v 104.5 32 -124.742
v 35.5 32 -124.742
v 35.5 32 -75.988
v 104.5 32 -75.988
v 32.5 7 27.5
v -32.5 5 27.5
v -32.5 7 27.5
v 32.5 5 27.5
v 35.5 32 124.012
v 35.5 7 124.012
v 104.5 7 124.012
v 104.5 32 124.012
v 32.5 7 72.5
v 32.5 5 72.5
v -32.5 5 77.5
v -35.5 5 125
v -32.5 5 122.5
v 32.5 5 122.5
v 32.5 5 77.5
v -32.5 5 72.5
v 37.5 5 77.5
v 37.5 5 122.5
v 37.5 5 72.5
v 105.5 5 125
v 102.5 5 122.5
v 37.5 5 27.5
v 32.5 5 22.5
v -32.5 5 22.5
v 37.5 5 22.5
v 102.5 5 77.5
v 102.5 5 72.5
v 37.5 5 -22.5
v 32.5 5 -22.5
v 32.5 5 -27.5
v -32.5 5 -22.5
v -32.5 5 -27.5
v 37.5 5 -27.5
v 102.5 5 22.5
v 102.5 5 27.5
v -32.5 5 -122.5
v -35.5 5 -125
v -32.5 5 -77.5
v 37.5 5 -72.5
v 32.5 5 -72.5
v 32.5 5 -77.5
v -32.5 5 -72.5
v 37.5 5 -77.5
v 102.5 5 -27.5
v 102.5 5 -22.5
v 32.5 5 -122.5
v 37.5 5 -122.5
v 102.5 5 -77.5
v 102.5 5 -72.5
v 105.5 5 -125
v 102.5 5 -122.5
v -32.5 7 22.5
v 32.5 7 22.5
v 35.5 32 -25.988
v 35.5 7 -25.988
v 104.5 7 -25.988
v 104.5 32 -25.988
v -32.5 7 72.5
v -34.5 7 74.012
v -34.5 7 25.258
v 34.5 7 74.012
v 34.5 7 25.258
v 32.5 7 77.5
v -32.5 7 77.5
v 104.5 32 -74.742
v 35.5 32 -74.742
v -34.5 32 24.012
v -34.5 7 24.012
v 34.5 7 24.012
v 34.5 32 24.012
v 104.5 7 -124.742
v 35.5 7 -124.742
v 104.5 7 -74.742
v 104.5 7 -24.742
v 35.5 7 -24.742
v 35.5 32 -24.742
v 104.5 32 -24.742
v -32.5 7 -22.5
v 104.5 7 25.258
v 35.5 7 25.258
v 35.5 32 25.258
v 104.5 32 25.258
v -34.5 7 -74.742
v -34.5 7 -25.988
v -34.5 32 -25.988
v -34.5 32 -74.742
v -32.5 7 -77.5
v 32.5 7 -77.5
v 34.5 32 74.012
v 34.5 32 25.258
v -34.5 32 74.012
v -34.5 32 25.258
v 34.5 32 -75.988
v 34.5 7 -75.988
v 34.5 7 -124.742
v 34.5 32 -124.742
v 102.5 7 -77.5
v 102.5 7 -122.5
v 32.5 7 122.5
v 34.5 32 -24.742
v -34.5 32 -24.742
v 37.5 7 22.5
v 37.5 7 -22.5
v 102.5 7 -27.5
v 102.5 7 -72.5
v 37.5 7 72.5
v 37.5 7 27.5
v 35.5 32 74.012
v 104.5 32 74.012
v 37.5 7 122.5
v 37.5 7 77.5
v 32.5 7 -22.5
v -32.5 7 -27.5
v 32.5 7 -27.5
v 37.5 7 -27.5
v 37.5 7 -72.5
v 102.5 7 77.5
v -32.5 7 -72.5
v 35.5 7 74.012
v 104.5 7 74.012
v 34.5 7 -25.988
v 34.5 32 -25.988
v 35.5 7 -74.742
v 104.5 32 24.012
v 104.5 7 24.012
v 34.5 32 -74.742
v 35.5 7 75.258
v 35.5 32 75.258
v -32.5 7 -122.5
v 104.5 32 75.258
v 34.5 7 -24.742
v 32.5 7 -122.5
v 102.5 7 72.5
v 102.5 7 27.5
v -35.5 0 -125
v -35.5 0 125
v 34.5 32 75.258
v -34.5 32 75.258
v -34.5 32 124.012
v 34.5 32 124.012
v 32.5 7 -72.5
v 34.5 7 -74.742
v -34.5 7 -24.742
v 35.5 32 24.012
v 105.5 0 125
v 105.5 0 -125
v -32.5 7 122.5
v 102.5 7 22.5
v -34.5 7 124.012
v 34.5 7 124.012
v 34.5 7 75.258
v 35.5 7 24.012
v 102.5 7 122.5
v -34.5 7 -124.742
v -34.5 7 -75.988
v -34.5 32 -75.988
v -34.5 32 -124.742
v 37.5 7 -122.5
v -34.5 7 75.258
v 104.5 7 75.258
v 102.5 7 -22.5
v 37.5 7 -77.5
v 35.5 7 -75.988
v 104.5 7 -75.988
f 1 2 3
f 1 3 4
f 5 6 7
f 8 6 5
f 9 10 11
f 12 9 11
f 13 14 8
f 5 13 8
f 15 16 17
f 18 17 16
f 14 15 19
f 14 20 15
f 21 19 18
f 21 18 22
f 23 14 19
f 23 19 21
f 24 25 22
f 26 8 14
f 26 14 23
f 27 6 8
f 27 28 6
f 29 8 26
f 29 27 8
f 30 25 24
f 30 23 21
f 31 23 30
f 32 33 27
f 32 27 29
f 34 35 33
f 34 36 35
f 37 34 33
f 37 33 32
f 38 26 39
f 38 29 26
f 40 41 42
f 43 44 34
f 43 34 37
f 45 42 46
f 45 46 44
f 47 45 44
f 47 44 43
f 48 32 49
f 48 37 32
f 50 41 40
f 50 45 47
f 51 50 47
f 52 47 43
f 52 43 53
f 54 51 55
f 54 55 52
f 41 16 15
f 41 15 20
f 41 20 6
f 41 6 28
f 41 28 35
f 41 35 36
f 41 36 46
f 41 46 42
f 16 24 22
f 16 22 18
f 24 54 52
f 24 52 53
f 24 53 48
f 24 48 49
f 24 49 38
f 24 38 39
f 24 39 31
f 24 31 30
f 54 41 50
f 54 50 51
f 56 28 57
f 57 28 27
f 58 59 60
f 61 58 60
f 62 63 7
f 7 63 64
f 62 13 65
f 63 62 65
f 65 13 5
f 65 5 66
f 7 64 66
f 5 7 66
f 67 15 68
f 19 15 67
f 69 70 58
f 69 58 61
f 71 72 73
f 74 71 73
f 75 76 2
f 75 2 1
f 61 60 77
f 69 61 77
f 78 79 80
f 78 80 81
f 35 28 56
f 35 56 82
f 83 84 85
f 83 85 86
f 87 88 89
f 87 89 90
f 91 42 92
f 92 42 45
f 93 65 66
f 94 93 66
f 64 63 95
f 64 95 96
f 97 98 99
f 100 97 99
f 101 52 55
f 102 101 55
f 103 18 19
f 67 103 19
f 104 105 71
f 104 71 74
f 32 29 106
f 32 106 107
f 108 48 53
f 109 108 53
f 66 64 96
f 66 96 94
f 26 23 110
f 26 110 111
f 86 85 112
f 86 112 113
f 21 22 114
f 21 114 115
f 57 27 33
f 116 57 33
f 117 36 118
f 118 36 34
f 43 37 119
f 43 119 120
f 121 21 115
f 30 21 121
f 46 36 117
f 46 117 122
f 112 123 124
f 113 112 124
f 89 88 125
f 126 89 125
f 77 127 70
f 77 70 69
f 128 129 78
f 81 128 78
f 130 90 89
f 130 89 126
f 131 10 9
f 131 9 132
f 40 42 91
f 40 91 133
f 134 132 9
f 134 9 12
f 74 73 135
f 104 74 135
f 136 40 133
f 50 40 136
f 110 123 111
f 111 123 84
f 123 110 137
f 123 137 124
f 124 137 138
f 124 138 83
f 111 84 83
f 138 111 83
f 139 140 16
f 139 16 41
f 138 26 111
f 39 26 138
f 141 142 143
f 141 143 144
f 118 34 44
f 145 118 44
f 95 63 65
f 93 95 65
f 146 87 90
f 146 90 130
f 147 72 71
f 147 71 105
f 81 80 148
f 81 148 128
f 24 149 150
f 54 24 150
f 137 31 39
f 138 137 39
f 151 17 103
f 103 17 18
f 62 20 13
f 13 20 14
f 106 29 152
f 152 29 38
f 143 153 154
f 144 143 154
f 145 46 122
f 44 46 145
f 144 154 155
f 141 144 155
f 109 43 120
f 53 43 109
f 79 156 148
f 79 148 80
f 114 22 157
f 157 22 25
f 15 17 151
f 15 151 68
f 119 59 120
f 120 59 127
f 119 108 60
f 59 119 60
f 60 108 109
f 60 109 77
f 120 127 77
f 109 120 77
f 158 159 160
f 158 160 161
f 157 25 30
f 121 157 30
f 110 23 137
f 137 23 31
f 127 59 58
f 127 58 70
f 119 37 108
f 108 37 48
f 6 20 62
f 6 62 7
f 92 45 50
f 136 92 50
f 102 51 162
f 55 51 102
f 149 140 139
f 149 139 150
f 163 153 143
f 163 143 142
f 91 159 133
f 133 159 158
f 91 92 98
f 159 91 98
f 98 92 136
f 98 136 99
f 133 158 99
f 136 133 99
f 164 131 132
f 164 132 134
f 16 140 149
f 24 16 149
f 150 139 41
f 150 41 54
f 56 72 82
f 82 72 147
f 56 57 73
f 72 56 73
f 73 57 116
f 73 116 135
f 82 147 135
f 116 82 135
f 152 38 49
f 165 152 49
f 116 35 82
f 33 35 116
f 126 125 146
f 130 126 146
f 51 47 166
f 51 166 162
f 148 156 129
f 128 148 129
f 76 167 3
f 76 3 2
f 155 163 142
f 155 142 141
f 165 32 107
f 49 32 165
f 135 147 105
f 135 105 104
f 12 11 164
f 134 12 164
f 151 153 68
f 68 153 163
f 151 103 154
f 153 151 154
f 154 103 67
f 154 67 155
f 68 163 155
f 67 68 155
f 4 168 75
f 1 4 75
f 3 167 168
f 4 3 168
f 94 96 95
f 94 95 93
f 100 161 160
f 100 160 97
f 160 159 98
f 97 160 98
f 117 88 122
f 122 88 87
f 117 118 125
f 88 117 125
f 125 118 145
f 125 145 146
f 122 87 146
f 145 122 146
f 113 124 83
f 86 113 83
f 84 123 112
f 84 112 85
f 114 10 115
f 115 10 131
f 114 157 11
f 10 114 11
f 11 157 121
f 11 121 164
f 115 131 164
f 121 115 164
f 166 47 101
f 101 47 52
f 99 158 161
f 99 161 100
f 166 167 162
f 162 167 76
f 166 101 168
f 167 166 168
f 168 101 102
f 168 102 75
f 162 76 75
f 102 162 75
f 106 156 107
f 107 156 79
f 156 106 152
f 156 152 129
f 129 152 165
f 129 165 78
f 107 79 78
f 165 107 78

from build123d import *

# Parameters (mm, degrees)
SKETCH1_W                 = 71
SKETCH1_H                 = 250
BOSS_EXTRUDE1_DEPTH       = 5
SKETCH2_W                 = 65
SKETCH2_H                 = 45
BOSS_EXTRUDE3_DEPTH       = 2
LPATTERN1_COUNT           = 5
LPATTERN1_PITCH           = 50
SKETCH3_W                 = 69
SKETCH3_H                 = 48.754858224
BOSS_EXTRUDE8_DEPTH       = 25
LPATTERN5_COUNT           = 5
LPATTERN5_PITCH           = 50
LPATTERN6_COUNT           = 2
LPATTERN6_PITCH           = 70
LPATTERN6_COPY_1_SKETCH_W = 65
LPATTERN6_COPY_1_SKETCH_H = 45
LPATTERN6_COPY_1_DEPTH    = 2
LPATTERN6_COPY_2_SKETCH_W = 65
LPATTERN6_COPY_2_SKETCH_H = 45
LPATTERN6_COPY_2_DEPTH    = 2
LPATTERN6_COPY_3_SKETCH_W = 65
LPATTERN6_COPY_3_SKETCH_H = 45
LPATTERN6_COPY_3_DEPTH    = 2
LPATTERN6_COPY_4_SKETCH_W = 65
LPATTERN6_COPY_4_SKETCH_H = 45
LPATTERN6_COPY_4_DEPTH    = 2
LPATTERN6_COPY_5_SKETCH_W = 69
LPATTERN6_COPY_5_SKETCH_H = 48.754858224
LPATTERN6_COPY_5_DEPTH    = 25
LPATTERN6_COPY_6_SKETCH_W = 69
LPATTERN6_COPY_6_SKETCH_H = 48.754858224
LPATTERN6_COPY_6_DEPTH    = 25
LPATTERN6_COPY_7_SKETCH_W = 69
LPATTERN6_COPY_7_SKETCH_H = 48.754858224
LPATTERN6_COPY_7_DEPTH    = 25
LPATTERN6_COPY_8_SKETCH_W = 69
LPATTERN6_COPY_8_SKETCH_H = 48.754858224
LPATTERN6_COPY_8_DEPTH    = 25


with BuildPart() as part:
    # Sketch1 → Boss-Extrude1 (new body)
    with BuildSketch(Plane(origin=(0, 0, 0), x_dir=(1, 0, 0), z_dir=(0, 1, 0))):
        Rectangle(SKETCH1_W, SKETCH1_H)
    boss_extrude1 = extrude(amount=BOSS_EXTRUDE1_DEPTH)

    # Sketch2 → Boss-Extrude3 (add)
    with BuildSketch(Plane(origin=(0, 5, 0), x_dir=(1, 0, 0), z_dir=(0, 1, 0))):
        with Locations((0, -100)):
            Rectangle(SKETCH2_W, SKETCH2_H)
    boss_extrude3 = extrude(amount=BOSS_EXTRUDE3_DEPTH)

    # LPattern1: Boss-Extrude3 ×5
    with Locations(*[(0, 0, -i * LPATTERN1_PITCH) for i in range(1, LPATTERN1_COUNT)]):
        add(boss_extrude3)

    # Sketch3 → Boss-Extrude8 (add)
    with BuildSketch(Plane(origin=(0, 7, 0), x_dir=(1, 0, 0), z_dir=(0, 1, 0))):
        with Locations((0, -99.635002086)):
            Rectangle(SKETCH3_W, SKETCH3_H)
    boss_extrude8 = extrude(amount=BOSS_EXTRUDE8_DEPTH)

    # LPattern5: Boss-Extrude8 ×5
    with Locations(*[(0, 0, -i * LPATTERN5_PITCH) for i in range(1, LPATTERN5_COUNT)]):
        add(boss_extrude8)

    # LPattern6: Boss-Extrude1, Boss-Extrude3, Boss-Extrude8 ×2
    with Locations(*[(i * LPATTERN6_PITCH, 0, 0) for i in range(1, LPATTERN6_COUNT)]):
        add(boss_extrude1)
        add(boss_extrude3)
        add(boss_extrude8)

    # LPattern6 copy 1 sketch → LPattern6 copy 1 (add)
    with BuildSketch(Plane(origin=(70, 5, -50), x_dir=(1, 0, 0), z_dir=(0, 1, 0))):
        with Locations((0, -100)):
            Rectangle(LPATTERN6_COPY_1_SKETCH_W, LPATTERN6_COPY_1_SKETCH_H)
    extrude(amount=LPATTERN6_COPY_1_DEPTH)

    # LPattern6 copy 2 sketch → LPattern6 copy 2 (add)
    with BuildSketch(Plane(origin=(70, 5, -100), x_dir=(1, 0, 0), z_dir=(0, 1, 0))):
        with Locations((0, -100)):
            Rectangle(LPATTERN6_COPY_2_SKETCH_W, LPATTERN6_COPY_2_SKETCH_H)
    extrude(amount=LPATTERN6_COPY_2_DEPTH)

    # LPattern6 copy 3 sketch → LPattern6 copy 3 (add)
    with BuildSketch(Plane(origin=(70, 5, -150), x_dir=(1, 0, 0), z_dir=(0, 1, 0))):
        with Locations((0, -100)):
            Rectangle(LPATTERN6_COPY_3_SKETCH_W, LPATTERN6_COPY_3_SKETCH_H)
    extrude(amount=LPATTERN6_COPY_3_DEPTH)

    # LPattern6 copy 4 sketch → LPattern6 copy 4 (add)
    with BuildSketch(Plane(origin=(70, 5, -200), x_dir=(1, 0, 0), z_dir=(0, 1, 0))):
        with Locations((0, -100)):
            Rectangle(LPATTERN6_COPY_4_SKETCH_W, LPATTERN6_COPY_4_SKETCH_H)
    extrude(amount=LPATTERN6_COPY_4_DEPTH)

    # LPattern6 copy 5 sketch → LPattern6 copy 5 (add)
    with BuildSketch(Plane(origin=(70, 7, -50), x_dir=(1, 0, 0), z_dir=(0, 1, 0))):
        with Locations((0, -99.635002086)):
            Rectangle(LPATTERN6_COPY_5_SKETCH_W, LPATTERN6_COPY_5_SKETCH_H)
    extrude(amount=LPATTERN6_COPY_5_DEPTH)

    # LPattern6 copy 6 sketch → LPattern6 copy 6 (add)
    with BuildSketch(Plane(origin=(70, 7, -100), x_dir=(1, 0, 0), z_dir=(0, 1, 0))):
        with Locations((0, -99.635002086)):
            Rectangle(LPATTERN6_COPY_6_SKETCH_W, LPATTERN6_COPY_6_SKETCH_H)
    extrude(amount=LPATTERN6_COPY_6_DEPTH)

    # LPattern6 copy 7 sketch → LPattern6 copy 7 (add)
    with BuildSketch(Plane(origin=(70, 7, -150), x_dir=(1, 0, 0), z_dir=(0, 1, 0))):
        with Locations((0, -99.635002086)):
            Rectangle(LPATTERN6_COPY_7_SKETCH_W, LPATTERN6_COPY_7_SKETCH_H)
    extrude(amount=LPATTERN6_COPY_7_DEPTH)

    # LPattern6 copy 8 sketch → LPattern6 copy 8 (add)
    with BuildSketch(Plane(origin=(70, 7, -200), x_dir=(1, 0, 0), z_dir=(0, 1, 0))):
        with Locations((0, -99.635002086)):
            Rectangle(LPATTERN6_COPY_8_SKETCH_W, LPATTERN6_COPY_8_SKETCH_H)
    extrude(amount=LPATTERN6_COPY_8_DEPTH)


solid = part.part
